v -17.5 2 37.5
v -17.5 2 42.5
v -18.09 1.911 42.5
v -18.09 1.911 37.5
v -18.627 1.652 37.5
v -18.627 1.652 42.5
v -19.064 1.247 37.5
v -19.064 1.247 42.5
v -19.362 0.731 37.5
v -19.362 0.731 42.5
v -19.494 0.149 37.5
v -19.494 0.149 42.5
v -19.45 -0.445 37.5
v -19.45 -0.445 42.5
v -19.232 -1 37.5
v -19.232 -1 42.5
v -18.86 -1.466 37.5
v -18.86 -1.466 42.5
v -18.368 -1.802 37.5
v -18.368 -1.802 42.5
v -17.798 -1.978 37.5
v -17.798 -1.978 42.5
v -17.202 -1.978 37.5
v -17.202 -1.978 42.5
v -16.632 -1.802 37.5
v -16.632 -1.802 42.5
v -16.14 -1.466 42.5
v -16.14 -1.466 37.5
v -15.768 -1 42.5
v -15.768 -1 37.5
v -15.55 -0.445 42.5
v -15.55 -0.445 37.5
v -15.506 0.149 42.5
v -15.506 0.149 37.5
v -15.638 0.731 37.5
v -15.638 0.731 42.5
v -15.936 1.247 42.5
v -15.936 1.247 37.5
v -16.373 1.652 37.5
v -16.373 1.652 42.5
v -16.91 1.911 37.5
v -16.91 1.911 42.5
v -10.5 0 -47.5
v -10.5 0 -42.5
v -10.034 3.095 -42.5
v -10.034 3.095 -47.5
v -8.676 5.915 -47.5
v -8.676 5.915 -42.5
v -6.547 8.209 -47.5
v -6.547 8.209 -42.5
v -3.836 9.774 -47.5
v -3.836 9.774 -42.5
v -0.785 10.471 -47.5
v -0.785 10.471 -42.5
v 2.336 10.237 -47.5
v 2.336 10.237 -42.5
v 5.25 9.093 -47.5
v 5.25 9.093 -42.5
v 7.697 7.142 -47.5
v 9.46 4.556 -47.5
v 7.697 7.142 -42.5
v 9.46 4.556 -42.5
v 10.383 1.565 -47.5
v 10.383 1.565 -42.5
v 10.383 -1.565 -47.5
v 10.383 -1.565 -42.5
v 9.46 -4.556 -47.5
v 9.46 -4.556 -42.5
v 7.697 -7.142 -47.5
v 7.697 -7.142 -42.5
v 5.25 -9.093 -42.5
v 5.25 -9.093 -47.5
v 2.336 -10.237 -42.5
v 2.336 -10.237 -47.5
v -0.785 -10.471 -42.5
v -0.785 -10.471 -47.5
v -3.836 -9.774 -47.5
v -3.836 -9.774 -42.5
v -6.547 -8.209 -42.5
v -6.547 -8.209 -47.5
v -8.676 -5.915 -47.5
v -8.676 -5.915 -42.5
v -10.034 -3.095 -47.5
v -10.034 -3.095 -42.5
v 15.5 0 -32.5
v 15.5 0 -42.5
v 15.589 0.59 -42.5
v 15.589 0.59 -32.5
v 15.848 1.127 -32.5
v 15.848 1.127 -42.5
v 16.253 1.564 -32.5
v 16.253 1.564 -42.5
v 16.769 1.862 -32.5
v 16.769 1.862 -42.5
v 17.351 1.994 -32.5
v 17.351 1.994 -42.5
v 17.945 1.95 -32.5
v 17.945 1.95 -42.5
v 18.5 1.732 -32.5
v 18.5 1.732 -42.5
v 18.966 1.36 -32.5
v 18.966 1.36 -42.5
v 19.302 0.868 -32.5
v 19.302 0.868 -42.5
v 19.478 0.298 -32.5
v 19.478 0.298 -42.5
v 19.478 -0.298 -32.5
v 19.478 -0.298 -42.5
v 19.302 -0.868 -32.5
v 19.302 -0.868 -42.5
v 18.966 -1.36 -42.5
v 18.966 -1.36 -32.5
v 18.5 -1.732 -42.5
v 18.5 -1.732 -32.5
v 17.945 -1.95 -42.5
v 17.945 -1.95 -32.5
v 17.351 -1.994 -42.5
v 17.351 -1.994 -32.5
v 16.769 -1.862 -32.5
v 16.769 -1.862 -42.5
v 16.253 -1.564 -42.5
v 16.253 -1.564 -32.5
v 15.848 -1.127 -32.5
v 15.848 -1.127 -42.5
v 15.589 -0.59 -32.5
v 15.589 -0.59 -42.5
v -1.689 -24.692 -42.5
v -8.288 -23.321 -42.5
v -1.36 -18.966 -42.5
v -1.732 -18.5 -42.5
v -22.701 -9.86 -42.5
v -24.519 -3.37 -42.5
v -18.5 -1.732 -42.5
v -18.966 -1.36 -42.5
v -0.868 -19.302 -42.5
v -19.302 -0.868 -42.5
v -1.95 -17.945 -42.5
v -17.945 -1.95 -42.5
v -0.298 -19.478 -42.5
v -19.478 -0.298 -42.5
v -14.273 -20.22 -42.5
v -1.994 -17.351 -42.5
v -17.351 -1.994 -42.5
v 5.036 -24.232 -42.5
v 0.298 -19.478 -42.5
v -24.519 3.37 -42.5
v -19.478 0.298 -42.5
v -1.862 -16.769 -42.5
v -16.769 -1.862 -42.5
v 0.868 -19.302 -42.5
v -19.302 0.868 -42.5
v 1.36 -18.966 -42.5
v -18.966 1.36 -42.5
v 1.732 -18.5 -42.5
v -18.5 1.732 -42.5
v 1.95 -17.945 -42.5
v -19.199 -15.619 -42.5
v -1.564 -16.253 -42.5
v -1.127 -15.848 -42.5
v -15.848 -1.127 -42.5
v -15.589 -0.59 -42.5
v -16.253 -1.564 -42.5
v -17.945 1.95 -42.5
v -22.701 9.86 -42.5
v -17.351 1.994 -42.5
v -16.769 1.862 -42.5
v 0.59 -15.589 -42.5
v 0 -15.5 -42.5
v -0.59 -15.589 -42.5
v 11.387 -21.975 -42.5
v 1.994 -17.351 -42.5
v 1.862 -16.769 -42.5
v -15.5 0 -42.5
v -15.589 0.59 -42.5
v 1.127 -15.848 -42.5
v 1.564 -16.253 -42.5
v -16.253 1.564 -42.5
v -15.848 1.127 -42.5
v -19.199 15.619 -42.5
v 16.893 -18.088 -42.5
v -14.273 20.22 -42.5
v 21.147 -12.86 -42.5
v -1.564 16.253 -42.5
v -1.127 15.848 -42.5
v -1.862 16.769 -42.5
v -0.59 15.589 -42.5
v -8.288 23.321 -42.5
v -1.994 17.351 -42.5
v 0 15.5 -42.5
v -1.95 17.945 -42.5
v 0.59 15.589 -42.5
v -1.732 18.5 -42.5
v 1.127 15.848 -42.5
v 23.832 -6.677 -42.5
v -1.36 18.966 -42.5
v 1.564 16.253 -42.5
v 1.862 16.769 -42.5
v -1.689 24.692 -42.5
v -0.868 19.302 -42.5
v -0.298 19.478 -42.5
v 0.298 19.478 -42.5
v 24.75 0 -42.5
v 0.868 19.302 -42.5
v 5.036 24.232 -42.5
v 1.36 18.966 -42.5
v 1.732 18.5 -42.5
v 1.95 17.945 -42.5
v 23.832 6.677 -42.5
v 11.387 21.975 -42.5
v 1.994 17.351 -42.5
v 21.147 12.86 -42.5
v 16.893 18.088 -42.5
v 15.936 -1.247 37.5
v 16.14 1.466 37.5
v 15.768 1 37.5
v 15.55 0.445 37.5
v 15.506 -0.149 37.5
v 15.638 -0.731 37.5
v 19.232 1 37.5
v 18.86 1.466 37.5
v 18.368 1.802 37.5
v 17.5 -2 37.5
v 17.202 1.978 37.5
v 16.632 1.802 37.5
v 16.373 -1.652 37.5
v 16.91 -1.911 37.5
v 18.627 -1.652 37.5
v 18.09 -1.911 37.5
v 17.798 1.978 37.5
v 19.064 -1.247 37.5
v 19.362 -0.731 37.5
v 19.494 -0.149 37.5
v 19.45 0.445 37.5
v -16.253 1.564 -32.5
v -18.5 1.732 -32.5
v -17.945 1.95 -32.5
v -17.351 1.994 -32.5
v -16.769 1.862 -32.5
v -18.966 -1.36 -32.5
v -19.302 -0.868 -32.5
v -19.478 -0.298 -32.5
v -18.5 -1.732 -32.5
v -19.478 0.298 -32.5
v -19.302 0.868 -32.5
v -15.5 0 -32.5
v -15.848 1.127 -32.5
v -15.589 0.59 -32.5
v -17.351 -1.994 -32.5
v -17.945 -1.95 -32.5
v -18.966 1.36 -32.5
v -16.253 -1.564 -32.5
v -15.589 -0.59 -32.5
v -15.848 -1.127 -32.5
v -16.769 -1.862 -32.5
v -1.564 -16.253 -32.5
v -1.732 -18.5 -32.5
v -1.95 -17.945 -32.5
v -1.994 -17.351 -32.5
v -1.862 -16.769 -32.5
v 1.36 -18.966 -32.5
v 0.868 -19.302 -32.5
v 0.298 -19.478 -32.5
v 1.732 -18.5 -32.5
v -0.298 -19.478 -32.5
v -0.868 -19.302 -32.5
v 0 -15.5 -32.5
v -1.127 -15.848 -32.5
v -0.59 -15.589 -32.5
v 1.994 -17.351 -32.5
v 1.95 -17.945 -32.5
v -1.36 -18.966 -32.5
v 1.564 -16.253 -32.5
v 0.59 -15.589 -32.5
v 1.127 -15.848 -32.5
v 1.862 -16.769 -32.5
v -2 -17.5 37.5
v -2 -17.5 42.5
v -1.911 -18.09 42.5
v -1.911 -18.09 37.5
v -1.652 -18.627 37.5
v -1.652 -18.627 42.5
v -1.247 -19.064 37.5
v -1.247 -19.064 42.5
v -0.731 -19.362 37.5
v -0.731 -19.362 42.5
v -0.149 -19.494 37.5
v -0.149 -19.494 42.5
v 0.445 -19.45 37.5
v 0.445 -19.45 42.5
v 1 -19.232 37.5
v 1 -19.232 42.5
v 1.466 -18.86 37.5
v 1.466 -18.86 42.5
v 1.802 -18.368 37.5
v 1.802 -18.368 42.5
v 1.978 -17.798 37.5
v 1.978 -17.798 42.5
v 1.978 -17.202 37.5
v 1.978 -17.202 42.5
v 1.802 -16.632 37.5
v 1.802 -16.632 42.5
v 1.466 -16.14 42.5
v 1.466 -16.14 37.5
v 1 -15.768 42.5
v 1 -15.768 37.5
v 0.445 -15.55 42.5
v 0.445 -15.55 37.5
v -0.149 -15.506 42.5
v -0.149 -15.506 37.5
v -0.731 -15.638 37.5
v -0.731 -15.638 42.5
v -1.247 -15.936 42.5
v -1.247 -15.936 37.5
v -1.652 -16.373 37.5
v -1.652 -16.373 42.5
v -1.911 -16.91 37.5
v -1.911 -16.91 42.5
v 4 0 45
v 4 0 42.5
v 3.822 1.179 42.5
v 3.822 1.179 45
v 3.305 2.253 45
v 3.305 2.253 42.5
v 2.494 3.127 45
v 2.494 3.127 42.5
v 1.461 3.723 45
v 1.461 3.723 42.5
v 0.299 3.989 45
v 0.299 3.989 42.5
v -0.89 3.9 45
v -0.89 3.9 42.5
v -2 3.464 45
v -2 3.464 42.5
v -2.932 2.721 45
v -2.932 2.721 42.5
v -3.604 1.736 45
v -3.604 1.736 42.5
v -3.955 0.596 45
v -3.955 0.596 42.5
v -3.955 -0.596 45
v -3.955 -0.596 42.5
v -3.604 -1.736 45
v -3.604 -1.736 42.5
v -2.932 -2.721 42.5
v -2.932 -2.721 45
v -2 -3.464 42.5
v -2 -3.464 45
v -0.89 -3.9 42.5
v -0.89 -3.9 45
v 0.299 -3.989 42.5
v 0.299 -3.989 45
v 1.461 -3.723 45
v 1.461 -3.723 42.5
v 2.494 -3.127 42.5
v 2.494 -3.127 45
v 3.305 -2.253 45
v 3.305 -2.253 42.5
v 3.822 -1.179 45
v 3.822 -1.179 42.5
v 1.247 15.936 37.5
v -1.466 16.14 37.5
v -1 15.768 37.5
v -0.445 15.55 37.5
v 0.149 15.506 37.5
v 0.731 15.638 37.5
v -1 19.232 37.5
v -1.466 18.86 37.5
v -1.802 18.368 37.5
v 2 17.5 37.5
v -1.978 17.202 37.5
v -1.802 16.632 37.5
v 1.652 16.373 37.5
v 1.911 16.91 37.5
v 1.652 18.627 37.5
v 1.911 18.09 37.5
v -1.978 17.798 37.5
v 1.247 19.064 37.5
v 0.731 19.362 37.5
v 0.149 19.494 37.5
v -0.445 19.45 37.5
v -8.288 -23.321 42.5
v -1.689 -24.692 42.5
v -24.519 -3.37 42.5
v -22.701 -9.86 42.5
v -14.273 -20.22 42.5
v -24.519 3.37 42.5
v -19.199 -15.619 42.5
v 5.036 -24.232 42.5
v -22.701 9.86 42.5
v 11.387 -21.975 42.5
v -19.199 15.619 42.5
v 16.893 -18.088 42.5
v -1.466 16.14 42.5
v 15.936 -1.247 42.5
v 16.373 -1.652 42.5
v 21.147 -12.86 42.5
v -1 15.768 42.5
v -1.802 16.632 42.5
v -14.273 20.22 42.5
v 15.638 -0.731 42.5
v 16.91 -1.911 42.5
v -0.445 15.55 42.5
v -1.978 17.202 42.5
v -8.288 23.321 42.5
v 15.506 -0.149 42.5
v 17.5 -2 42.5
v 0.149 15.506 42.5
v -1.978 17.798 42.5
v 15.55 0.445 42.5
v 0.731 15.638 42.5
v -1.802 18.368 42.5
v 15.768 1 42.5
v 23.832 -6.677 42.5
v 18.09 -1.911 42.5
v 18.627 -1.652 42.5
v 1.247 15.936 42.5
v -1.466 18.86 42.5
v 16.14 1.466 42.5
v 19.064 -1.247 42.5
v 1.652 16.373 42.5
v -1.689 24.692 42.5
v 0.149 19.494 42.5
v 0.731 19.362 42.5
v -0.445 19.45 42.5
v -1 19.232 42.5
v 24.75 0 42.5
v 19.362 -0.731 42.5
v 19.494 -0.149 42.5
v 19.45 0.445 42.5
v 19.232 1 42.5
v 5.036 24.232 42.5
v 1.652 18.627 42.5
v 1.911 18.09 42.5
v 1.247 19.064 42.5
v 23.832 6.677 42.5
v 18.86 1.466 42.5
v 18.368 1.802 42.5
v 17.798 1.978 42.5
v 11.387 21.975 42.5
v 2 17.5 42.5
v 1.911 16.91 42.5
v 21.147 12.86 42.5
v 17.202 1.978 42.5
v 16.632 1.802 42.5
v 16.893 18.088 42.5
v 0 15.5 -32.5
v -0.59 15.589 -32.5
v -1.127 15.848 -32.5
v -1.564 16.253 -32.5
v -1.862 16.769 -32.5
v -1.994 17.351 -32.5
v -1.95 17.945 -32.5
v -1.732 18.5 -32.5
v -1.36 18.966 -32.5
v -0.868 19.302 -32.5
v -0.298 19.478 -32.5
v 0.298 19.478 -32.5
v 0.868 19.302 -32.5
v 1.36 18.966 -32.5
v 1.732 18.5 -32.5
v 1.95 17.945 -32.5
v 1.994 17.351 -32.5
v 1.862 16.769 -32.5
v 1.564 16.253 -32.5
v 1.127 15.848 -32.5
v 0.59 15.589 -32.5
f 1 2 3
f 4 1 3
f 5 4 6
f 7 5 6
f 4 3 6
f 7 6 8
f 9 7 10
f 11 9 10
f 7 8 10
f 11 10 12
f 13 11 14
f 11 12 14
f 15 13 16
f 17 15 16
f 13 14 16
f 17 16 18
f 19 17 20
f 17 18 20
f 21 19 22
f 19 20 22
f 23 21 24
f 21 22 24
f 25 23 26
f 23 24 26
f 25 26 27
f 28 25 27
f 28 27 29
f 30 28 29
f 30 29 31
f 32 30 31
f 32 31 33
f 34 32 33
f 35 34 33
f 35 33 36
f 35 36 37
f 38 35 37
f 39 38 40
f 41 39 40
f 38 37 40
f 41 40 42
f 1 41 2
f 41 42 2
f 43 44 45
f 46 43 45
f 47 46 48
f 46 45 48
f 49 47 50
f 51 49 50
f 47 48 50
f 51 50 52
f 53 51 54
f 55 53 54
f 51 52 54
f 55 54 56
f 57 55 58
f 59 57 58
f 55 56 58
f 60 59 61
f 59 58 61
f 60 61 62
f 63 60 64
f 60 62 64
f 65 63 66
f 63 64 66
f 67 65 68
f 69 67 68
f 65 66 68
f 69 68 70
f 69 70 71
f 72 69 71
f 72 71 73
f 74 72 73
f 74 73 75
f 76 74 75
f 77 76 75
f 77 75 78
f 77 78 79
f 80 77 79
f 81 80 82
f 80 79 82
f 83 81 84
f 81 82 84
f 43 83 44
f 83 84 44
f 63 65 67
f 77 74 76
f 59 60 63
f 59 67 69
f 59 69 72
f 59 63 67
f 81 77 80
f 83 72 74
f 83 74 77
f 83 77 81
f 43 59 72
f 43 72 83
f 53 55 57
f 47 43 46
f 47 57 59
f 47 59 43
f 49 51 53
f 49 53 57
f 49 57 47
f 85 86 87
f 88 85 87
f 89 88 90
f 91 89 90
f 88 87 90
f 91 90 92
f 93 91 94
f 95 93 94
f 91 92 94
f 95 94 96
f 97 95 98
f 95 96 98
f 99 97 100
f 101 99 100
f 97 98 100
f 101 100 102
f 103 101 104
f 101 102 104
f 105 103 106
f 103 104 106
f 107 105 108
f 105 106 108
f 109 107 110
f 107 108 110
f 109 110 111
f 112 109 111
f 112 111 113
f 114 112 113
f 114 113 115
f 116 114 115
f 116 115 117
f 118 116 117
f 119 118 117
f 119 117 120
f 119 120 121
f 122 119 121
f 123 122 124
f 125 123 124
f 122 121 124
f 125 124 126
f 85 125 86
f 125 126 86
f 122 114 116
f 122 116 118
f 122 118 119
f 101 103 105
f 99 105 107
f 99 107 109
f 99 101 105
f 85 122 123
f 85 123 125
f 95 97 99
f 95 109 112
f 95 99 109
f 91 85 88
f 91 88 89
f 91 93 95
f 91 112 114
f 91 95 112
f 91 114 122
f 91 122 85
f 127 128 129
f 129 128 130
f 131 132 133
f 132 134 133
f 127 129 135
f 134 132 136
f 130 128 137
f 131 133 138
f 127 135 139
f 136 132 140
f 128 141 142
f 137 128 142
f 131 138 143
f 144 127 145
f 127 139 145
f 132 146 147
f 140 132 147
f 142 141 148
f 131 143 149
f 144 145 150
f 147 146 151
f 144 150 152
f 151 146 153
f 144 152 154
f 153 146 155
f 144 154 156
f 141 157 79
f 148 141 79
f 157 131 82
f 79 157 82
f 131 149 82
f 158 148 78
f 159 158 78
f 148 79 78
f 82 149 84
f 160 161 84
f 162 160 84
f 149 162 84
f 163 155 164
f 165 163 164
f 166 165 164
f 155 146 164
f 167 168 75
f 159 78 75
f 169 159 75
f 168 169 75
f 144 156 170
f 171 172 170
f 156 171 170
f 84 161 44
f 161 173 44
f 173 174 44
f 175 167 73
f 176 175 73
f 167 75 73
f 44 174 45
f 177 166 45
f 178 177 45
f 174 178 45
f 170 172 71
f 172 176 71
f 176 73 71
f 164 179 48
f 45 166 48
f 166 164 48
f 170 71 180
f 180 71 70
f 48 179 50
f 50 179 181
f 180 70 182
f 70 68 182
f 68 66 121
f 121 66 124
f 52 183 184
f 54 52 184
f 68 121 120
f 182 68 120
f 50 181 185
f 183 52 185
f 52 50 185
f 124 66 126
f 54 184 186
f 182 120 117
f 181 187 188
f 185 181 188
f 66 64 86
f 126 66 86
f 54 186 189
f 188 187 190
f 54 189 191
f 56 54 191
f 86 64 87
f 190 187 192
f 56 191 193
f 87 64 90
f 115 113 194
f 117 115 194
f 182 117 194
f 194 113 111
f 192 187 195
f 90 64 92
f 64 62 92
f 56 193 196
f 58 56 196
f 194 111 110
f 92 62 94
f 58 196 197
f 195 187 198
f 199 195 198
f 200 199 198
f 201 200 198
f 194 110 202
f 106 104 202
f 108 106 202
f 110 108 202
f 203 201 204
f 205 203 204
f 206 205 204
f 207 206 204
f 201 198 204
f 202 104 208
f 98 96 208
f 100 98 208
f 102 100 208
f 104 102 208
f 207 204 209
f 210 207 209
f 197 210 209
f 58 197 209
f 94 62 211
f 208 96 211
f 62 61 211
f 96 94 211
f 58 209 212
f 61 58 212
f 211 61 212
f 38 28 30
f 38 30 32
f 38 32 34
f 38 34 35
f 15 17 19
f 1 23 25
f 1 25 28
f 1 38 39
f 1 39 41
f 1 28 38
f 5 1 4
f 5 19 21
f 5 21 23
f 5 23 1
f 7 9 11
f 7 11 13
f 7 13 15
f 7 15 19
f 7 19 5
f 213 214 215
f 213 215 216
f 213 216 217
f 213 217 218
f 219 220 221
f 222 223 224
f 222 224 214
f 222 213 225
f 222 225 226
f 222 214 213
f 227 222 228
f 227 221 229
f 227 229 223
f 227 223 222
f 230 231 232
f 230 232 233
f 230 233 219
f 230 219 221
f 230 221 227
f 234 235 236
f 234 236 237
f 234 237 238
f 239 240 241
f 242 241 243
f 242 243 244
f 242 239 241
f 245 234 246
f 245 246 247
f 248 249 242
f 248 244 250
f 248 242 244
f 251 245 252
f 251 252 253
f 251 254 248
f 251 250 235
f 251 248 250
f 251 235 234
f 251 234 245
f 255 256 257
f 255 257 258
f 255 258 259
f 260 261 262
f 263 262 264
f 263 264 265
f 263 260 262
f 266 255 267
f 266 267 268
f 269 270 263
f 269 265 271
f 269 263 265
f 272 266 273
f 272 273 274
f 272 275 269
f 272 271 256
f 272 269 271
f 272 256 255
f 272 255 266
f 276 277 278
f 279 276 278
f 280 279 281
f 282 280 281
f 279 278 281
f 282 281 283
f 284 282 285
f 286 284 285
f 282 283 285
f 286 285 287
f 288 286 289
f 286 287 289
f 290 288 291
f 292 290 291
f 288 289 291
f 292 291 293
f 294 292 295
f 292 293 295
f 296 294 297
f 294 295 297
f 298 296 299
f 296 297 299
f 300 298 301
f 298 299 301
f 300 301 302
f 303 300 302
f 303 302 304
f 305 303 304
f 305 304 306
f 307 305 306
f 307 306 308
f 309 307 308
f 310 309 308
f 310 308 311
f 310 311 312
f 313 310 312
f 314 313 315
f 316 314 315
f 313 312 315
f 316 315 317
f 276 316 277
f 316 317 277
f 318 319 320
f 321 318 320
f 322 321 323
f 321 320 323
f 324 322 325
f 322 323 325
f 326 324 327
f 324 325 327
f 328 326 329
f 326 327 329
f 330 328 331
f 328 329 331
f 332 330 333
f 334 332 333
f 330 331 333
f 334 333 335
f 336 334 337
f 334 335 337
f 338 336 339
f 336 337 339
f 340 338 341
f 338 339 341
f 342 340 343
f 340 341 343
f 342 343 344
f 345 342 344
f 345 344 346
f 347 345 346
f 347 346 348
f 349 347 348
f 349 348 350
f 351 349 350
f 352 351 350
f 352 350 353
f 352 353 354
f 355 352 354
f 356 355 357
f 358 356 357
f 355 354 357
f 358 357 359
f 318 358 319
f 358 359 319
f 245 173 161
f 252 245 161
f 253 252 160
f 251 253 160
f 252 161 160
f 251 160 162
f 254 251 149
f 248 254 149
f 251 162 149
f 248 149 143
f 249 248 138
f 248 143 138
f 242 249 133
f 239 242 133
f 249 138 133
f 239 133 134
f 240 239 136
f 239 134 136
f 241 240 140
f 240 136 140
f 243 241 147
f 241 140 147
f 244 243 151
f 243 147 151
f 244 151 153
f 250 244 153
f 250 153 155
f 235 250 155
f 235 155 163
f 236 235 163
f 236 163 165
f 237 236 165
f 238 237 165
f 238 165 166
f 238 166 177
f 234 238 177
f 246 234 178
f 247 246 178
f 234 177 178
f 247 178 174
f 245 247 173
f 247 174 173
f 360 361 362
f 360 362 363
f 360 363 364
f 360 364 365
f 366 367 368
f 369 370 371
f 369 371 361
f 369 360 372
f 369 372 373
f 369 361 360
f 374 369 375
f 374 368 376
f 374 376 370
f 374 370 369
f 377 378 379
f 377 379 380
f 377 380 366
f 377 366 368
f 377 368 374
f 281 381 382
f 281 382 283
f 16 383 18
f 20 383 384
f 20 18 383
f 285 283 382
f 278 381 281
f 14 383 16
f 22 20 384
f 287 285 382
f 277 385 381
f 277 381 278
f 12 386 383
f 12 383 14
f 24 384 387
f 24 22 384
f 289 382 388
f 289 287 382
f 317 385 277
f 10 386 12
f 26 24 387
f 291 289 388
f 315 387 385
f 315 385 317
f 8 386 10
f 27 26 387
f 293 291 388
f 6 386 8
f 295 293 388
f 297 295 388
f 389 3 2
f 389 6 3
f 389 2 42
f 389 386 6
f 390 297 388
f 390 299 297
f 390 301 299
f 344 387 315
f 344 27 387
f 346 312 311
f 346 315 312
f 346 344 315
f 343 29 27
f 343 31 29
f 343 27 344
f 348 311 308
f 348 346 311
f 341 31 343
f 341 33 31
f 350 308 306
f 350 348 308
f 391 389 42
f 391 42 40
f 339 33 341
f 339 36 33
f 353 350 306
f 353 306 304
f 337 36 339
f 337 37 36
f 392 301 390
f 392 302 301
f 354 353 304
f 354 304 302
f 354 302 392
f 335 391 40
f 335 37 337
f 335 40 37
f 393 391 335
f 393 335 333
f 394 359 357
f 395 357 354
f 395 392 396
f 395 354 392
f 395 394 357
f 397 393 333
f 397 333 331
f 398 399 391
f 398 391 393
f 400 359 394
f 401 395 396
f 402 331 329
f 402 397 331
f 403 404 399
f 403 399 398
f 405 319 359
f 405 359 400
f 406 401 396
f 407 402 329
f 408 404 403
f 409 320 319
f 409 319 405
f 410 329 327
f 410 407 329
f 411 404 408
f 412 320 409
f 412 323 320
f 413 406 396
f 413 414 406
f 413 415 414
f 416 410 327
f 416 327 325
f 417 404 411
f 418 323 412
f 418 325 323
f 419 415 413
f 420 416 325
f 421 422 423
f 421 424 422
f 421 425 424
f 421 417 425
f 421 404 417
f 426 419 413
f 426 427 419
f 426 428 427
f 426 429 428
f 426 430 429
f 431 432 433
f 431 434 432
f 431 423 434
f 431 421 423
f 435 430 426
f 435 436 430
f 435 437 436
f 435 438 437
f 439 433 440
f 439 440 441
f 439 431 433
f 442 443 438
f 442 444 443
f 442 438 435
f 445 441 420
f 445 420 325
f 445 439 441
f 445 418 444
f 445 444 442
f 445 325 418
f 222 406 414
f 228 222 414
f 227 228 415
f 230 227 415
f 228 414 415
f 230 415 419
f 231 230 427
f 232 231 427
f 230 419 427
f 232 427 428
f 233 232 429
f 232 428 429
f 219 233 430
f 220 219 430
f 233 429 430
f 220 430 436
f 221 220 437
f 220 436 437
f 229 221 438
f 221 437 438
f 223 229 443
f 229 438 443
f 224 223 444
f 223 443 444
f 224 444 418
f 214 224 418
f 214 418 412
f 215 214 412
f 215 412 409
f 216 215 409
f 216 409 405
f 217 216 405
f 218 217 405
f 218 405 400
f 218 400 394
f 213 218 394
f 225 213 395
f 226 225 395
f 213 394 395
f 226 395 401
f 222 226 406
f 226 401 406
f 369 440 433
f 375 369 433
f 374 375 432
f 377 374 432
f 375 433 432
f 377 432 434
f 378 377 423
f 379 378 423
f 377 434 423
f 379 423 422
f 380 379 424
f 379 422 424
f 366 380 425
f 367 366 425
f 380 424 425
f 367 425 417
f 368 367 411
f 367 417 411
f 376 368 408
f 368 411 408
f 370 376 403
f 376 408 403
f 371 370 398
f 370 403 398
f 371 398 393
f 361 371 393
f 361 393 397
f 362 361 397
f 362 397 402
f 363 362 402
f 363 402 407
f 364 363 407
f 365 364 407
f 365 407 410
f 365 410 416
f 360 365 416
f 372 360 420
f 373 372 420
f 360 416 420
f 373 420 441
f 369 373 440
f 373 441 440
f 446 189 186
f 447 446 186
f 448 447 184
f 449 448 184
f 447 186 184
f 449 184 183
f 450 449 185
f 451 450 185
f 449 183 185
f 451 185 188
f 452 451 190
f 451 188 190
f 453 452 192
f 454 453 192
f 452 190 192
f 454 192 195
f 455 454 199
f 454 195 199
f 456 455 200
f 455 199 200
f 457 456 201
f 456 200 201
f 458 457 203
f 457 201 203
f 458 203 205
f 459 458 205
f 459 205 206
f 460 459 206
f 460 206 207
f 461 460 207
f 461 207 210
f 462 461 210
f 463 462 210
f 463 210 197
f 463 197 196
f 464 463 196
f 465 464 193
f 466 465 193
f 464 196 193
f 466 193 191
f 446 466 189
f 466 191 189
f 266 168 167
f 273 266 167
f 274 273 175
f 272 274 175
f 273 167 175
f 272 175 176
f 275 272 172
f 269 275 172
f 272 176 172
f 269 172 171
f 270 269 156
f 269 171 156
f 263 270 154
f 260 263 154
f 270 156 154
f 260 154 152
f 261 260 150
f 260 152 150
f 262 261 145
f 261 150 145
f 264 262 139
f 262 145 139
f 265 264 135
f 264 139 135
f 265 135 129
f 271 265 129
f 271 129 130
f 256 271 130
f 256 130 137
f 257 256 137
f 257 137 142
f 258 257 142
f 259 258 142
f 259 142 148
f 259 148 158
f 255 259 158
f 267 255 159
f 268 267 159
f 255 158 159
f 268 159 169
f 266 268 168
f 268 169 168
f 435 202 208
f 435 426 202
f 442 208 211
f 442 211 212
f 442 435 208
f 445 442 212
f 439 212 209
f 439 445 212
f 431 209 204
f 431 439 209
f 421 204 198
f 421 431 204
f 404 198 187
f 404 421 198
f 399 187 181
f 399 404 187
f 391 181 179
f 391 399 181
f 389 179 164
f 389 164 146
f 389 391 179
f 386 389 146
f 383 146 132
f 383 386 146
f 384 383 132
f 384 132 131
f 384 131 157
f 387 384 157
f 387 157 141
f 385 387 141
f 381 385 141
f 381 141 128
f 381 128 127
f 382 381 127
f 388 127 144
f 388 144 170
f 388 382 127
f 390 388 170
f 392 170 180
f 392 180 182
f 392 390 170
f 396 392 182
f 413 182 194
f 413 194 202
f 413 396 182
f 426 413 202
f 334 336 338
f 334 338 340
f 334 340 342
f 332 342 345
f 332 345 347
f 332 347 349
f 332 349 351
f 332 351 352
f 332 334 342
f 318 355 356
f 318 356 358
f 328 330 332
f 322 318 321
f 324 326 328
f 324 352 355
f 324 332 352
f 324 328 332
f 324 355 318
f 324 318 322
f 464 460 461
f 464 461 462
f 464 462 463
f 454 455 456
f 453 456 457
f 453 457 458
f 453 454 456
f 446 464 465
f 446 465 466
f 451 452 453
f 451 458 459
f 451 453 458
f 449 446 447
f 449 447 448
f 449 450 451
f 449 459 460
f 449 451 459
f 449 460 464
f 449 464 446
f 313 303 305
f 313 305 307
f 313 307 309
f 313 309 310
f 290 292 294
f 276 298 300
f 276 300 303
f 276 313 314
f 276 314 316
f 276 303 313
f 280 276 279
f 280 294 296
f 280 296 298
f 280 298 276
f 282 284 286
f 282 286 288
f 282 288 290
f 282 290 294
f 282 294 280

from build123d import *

# Parameters (mm, degrees)
SKETCH1_R           = 24.75
BOSS_EXTRUDE1_DEPTH = 42.5
SKETCH2_R           = 4
BOSS_EXTRUDE2_DEPTH = 2.5
SKETCH6_R           = 2
CUT_EXTRUDE3_DEPTH  = 5
CIRPATTERN1_COUNT   = 4
SKETCH5_R           = 2
CUT_EXTRUDE2_DEPTH  = 10
CIRPATTERN2_COUNT   = 4
SKETCH7_R           = 10.5
BOSS_EXTRUDE3_DEPTH = 5


with BuildPart() as part:
    # Sketch1 → Boss-Extrude1 (new body, symmetric)
    with BuildSketch(Plane.XY):
        Circle(SKETCH1_R)
    extrude(amount=BOSS_EXTRUDE1_DEPTH, both=True)

    # Sketch2 → Boss-Extrude2 (add)
    with BuildSketch(Plane.XY.offset(42.5)):
        Circle(SKETCH2_R)
    extrude(amount=BOSS_EXTRUDE2_DEPTH)

    # Sketch6 → Cut-Extrude3 (cut)
    with BuildSketch(Plane.XY.offset(42.5)):
        with Locations((0, 17.5)):
            Circle(SKETCH6_R)
    cut_extrude3 = extrude(amount=-CUT_EXTRUDE3_DEPTH, mode=Mode.SUBTRACT)

    # CirPattern1: Cut-Extrude3 ×4 about axis
    cirpattern1_axis = Axis((0, 0, 0), (0, 0, 1))
    for i in range(1, CIRPATTERN1_COUNT):
        add(cut_extrude3.rotate(cirpattern1_axis, i * 360 / CIRPATTERN1_COUNT), mode=Mode.SUBTRACT)

    # Sketch5 → Cut-Extrude2 (cut)
    with BuildSketch(Plane(origin=(0, 0, -42.5), x_dir=(-1, 0, 0), z_dir=(0, 0, -1))):
        with Locations((-17.5, 0)):
            Circle(SKETCH5_R)
    cut_extrude2 = extrude(amount=-CUT_EXTRUDE2_DEPTH, mode=Mode.SUBTRACT)

    # CirPattern2: Cut-Extrude2 ×4 about axis
    cirpattern2_axis = Axis((0, 0, 0), (0, 0, 1))
    for i in range(1, CIRPATTERN2_COUNT):
        add(cut_extrude2.rotate(cirpattern2_axis, i * 360 / CIRPATTERN2_COUNT), mode=Mode.SUBTRACT)

    # Sketch7 → Boss-Extrude3 (add)
    with BuildSketch(Plane(origin=(0, 0, -42.5), x_dir=(-1, 0, 0), z_dir=(0, 0, -1))):
        Circle(SKETCH7_R)
    extrude(amount=BOSS_EXTRUDE3_DEPTH)


solid = part.part
